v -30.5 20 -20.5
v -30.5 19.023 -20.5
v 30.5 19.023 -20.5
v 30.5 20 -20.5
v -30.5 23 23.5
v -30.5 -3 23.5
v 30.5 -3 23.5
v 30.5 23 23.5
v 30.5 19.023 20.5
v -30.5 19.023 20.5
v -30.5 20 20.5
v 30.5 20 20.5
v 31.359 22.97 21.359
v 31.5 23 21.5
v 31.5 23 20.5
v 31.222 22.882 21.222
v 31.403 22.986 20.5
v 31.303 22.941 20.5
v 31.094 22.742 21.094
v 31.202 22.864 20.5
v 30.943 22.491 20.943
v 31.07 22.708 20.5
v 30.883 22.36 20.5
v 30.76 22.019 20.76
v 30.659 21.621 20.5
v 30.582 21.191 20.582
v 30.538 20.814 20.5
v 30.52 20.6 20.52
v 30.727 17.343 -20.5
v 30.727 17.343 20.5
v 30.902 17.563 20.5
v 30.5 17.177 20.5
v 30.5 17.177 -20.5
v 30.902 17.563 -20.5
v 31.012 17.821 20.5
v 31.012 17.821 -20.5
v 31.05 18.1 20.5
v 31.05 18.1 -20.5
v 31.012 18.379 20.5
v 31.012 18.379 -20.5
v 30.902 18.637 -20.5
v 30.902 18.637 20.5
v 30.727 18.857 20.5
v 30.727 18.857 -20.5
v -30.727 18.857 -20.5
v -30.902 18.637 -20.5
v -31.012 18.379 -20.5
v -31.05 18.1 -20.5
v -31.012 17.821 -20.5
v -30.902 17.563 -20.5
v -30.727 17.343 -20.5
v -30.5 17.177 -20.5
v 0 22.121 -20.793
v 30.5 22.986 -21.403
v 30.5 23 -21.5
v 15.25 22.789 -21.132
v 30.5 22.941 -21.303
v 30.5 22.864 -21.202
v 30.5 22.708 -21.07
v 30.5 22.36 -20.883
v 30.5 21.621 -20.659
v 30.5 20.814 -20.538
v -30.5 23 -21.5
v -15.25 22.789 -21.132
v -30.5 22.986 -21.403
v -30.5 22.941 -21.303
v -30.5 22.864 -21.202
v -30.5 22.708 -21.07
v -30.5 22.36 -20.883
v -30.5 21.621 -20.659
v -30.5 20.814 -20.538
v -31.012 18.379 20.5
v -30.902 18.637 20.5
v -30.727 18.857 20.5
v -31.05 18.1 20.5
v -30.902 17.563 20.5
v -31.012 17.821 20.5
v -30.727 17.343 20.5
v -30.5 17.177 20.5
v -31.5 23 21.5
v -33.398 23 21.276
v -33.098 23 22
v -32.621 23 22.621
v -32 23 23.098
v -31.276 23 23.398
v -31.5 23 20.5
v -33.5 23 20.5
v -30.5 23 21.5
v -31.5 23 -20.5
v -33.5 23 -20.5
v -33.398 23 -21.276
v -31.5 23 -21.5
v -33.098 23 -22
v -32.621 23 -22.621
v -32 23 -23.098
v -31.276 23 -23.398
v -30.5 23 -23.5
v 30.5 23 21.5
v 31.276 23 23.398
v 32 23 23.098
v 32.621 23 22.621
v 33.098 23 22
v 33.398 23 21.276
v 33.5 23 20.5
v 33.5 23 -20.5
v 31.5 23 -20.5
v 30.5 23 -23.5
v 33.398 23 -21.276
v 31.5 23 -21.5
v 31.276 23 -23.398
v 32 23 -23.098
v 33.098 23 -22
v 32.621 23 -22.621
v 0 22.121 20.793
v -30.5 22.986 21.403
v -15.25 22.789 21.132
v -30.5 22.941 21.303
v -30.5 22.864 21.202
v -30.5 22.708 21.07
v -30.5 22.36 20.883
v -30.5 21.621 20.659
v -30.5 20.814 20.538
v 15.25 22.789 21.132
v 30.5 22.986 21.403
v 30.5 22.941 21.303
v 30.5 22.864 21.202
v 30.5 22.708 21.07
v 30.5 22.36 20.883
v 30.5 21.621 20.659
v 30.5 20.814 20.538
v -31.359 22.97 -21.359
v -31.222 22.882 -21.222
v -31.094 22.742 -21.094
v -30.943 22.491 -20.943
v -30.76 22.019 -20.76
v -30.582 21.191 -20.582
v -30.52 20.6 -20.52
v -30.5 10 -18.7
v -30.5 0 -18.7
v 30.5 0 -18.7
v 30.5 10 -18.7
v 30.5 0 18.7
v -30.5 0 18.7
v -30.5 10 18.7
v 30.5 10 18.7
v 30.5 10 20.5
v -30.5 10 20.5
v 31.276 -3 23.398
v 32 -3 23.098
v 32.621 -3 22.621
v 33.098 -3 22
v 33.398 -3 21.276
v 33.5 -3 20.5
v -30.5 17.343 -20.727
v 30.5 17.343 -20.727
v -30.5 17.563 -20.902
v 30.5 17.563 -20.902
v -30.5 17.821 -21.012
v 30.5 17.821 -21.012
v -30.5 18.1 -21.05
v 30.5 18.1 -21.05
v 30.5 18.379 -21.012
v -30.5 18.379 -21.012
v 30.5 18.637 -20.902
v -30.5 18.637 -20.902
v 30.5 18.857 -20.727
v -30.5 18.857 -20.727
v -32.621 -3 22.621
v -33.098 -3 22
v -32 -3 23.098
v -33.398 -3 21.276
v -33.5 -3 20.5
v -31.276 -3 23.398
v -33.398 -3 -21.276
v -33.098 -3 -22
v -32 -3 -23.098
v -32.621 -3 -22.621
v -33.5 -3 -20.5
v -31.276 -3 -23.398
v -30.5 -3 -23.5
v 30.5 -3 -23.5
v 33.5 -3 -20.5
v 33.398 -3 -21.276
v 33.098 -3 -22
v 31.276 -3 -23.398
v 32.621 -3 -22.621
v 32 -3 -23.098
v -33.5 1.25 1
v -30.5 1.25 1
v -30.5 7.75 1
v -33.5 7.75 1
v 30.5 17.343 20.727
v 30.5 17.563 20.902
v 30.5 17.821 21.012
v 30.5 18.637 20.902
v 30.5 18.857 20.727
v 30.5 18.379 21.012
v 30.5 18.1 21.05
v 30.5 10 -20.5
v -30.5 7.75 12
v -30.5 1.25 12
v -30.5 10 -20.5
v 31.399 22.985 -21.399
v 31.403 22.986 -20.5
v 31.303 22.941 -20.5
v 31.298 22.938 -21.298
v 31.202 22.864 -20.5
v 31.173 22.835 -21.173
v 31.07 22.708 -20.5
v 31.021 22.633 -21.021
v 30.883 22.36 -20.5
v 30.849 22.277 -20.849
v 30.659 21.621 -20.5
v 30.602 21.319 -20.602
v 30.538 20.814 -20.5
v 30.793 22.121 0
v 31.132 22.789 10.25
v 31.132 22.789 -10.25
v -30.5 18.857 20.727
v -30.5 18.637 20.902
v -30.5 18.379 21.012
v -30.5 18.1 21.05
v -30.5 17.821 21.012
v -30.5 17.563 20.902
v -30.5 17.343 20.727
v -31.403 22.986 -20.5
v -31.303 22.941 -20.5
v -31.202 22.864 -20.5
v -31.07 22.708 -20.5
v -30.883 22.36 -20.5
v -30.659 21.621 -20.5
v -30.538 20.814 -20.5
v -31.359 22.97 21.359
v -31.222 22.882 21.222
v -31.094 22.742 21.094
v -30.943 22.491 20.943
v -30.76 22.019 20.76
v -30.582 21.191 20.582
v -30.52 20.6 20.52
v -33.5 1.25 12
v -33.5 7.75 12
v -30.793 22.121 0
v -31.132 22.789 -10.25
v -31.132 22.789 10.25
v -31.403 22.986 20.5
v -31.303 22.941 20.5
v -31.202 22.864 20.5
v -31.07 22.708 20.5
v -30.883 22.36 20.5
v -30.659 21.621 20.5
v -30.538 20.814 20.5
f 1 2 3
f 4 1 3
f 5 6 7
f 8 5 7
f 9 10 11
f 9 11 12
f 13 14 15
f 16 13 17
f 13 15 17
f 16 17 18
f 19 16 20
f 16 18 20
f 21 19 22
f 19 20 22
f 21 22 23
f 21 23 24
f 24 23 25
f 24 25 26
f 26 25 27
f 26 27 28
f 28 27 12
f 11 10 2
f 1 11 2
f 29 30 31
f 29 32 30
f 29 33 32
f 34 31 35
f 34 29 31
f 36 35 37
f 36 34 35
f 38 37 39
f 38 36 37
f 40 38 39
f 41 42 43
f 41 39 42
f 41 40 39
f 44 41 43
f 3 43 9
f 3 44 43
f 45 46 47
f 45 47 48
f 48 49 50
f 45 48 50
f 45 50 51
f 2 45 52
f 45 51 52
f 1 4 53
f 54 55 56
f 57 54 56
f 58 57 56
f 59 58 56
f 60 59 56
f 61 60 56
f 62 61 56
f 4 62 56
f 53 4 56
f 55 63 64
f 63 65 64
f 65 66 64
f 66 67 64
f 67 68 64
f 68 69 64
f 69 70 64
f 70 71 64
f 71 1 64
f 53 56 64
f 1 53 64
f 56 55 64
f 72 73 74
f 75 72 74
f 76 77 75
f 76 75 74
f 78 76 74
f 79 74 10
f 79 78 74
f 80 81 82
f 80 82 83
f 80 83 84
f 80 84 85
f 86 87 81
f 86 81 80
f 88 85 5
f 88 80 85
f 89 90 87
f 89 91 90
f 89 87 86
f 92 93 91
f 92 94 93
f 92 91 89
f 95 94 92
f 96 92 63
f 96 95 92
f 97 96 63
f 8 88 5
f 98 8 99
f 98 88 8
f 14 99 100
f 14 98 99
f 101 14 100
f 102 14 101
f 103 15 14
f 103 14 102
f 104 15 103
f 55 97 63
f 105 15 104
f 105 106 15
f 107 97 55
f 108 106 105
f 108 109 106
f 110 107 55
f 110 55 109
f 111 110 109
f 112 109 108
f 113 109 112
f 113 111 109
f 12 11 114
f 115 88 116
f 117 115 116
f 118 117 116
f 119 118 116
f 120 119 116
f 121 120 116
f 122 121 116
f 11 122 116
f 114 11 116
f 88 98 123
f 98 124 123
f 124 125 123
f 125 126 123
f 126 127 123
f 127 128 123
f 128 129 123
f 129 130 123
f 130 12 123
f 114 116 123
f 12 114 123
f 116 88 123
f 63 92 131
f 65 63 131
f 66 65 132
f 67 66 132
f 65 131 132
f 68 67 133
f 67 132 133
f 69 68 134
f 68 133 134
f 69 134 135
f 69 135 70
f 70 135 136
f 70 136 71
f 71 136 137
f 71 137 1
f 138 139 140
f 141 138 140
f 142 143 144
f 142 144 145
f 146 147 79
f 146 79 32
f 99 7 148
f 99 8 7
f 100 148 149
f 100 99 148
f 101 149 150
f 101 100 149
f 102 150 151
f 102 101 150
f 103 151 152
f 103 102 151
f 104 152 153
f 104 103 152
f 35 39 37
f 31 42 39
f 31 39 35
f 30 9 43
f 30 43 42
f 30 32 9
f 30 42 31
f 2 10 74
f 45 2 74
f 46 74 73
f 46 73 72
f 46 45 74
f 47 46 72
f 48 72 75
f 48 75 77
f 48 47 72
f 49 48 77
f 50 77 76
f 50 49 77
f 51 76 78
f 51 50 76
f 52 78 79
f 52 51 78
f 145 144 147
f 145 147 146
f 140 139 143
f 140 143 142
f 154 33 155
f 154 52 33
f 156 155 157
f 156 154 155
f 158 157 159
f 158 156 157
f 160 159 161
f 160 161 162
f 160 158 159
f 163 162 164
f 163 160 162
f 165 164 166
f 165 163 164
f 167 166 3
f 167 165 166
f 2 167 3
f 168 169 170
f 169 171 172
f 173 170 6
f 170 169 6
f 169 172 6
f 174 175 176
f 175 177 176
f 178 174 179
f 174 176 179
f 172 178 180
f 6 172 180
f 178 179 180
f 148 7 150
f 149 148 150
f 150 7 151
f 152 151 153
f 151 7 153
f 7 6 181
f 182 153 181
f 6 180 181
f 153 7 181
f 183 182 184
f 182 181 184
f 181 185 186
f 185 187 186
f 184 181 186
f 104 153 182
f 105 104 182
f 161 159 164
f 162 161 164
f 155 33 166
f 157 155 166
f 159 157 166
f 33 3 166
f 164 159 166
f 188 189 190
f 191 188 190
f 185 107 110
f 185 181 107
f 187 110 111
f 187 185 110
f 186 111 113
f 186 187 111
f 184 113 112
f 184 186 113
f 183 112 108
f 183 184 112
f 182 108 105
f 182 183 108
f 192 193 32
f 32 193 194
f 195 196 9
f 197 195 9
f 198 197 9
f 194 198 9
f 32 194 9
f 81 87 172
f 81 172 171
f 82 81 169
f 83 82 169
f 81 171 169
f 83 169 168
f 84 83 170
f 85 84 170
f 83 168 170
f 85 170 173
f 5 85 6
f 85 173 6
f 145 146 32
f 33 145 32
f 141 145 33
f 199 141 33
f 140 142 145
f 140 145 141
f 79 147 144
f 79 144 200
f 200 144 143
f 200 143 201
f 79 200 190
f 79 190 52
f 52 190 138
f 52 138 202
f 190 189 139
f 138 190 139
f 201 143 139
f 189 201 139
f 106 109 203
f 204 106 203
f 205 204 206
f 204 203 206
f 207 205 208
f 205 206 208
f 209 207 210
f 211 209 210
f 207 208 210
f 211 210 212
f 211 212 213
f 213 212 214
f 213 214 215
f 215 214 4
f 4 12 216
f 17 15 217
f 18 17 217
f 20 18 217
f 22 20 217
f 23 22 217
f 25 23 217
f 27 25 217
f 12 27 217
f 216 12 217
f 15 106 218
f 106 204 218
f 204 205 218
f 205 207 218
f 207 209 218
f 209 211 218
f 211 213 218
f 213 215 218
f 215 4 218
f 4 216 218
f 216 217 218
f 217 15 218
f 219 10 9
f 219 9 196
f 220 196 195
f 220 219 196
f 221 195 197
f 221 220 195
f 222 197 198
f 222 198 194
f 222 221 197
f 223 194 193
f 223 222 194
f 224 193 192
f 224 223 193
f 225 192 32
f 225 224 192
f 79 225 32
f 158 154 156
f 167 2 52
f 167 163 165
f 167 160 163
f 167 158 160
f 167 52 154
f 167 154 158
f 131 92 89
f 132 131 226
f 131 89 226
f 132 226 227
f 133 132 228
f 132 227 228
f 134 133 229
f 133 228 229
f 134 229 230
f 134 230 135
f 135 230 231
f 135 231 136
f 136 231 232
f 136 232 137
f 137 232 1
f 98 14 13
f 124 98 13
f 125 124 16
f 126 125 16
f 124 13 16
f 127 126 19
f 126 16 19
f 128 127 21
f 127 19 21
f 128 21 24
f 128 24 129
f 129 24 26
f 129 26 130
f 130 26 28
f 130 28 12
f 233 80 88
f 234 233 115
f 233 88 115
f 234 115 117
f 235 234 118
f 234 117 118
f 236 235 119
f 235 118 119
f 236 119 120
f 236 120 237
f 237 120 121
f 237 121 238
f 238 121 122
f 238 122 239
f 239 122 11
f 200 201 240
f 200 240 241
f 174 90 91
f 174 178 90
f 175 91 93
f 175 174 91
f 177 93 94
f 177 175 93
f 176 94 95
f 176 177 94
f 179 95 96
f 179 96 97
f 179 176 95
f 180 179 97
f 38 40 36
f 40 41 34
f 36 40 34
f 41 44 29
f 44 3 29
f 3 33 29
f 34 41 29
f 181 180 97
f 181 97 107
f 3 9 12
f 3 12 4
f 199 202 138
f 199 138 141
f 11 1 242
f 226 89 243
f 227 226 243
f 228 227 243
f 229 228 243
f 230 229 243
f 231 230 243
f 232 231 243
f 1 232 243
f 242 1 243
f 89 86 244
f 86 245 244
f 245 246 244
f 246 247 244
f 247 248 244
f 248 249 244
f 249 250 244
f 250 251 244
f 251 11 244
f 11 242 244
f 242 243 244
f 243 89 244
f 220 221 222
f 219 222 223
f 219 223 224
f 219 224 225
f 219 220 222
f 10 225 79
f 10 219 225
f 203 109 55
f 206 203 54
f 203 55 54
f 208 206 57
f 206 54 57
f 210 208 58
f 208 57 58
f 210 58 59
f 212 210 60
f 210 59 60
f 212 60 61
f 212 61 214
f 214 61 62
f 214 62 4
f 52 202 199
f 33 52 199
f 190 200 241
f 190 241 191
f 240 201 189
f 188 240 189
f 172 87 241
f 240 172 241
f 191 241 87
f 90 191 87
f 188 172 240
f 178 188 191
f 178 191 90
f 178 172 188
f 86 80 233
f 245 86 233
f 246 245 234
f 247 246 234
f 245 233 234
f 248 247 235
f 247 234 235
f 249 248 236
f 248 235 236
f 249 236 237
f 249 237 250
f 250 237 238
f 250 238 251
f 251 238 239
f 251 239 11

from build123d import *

# Parameters (mm, degrees)
SKETCH1_W           = 61
SKETCH1_H           = 41
BOSS_EXTRUDE1_DEPTH = 23
SHELL1_T            = 3
SKETCH2_W           = 11
SKETCH2_H           = 6.5
CUT_EXTRUDE1_DEPTH  = 72.953109731
SKETCH3_W           = 61
SKETCH3_H           = 1.8
BOSS_EXTRUDE2_DEPTH = 10
SKETCH4_R           = 1.05
CUT_EXTRUDE2_DEPTH  = 41
SKETCH5_R           = 1.05
CUT_EXTRUDE3_DEPTH  = 61
FILLET1_SIZE        = 1
FILLET1_SIZE_2      = 3
FILLET2_R           = 3


with BuildPart() as part:
    # Sketch1 → Boss-Extrude1 (new body)
    with BuildSketch(Plane(origin=(0, 0, 0), x_dir=(1, 0, 0), z_dir=(0, 1, 0))):
        Rectangle(SKETCH1_W, SKETCH1_H)
    extrude(amount=BOSS_EXTRUDE1_DEPTH)

    # Shell1
    shell1_openings = [part.faces().sort_by_distance(p)[0] for p in [
        (0, 23, 0),
    ]]
    offset(amount=SHELL1_T, openings=shell1_openings, kind=Kind.INTERSECTION)

    # Sketch2 → Cut-Extrude1 (cut, through all)
    with BuildSketch(Plane(origin=(-30.5, 0, 0), x_dir=(0, 0, -1), z_dir=(1, 0, 0))):
        with Locations((-6.5, 4.5)):
            Rectangle(SKETCH2_W, SKETCH2_H)
    extrude(amount=-CUT_EXTRUDE1_DEPTH, mode=Mode.SUBTRACT)

    # Sketch3 → Boss-Extrude2 (add)
    with BuildSketch(Plane(origin=(0, 0, 0), x_dir=(1, 0, 0), z_dir=(0, 1, 0))):
        with Locations((0, 19.6)):
            Rectangle(SKETCH3_W, SKETCH3_H)
        with Locations((0, -19.6)):
            Rectangle(SKETCH3_W, SKETCH3_H)
    extrude(amount=BOSS_EXTRUDE2_DEPTH)

    # Sketch4 → Cut-Extrude2 (cut)
    with BuildSketch(Plane.XY.offset(-20.5)):
        with Locations((-30, 18.1)):
            Circle(SKETCH4_R)
        with Locations((30, 18.1)):
            Circle(SKETCH4_R)
    extrude(amount=CUT_EXTRUDE2_DEPTH, mode=Mode.SUBTRACT)

    # Sketch5 → Cut-Extrude3 (cut)
    with BuildSketch(Plane(origin=(-30.5, 0, 0), x_dir=(0, 0, -1), z_dir=(1, 0, 0))):
        with Locations((-20, 18.1)):
            Circle(SKETCH5_R)
        with Locations((20, 18.1)):
            Circle(SKETCH5_R)
    extrude(amount=CUT_EXTRUDE3_DEPTH, mode=Mode.SUBTRACT)

    # Fillet1
    # an asymmetric fillet: 3, 1 mm, written as the material it takes off along each edge
    with BuildSketch(Plane(origin=(30.5, 23, 20.5), x_dir=(0, 0, 1), z_dir=(-1, 0, 0)), Plane(origin=(-30.5, 23, -20.5), x_dir=(0, 0, -1), z_dir=(1, 0, 0))) as fillet1_piece_1:
        with BuildLine():
            Bezier((FILLET1_SIZE, 0), (0, 0), (0, -FILLET1_SIZE_2), weights=[1, 0.707106781, 1])
            Line((0, -FILLET1_SIZE_2), (-0.06, -3))
            Line((-0.06, -3), (-0.06, 0.06))
            Line((-0.06, 0.06), (1, 0.06))
            Line((1, 0.06), (FILLET1_SIZE, 0))
        make_face()
    extrude(amount=61, mode=Mode.SUBTRACT)
    with BuildSketch(Plane(origin=(30.5, 23, -20.5), x_dir=(1, 0, 0), z_dir=(0, 0, 1)), Plane(origin=(-30.5, 23, 20.5), x_dir=(-1, 0, 0), z_dir=(0, 0, -1))) as fillet1_piece_2:
        with BuildLine():
            Bezier((FILLET1_SIZE, 0), (0, 0), (0, -FILLET1_SIZE_2), weights=[1, 0.707106781, 1])
            Line((0, -FILLET1_SIZE_2), (-0.06, -3))
            Line((-0.06, -3), (-0.06, 0.06))
            Line((-0.06, 0.06), (1, 0.06))
            Line((1, 0.06), (FILLET1_SIZE, 0))
        make_face()
    extrude(amount=41, mode=Mode.SUBTRACT)
    with BuildSketch(Plane(origin=(38, 23, 20.5), x_dir=(0, 0, 1), z_dir=(-1, 0, 0))) as fillet1_piece_3a_section:
        with BuildLine():
            Bezier((FILLET1_SIZE, 0), (0, 0), (0, -FILLET1_SIZE_2), weights=[1, 0.707106781, 1])
            Line((0, -FILLET1_SIZE_2), (-0.06, -3))
            Line((-0.06, -3), (-0.06, 0.06))
            Line((-0.06, 0.06), (1, 0.06))
            Line((1, 0.06), (FILLET1_SIZE, 0))
        make_face()
    fillet1_piece_3a = extrude(amount=68.5, mode=Mode.PRIVATE)
    fillet1_piece_3a = split(fillet1_piece_3a, bisect_by=Plane(origin=(30.5, 22.211737764, 20.689651293), z_dir=(1, 0, 0)), keep=Keep.TOP, mode=Mode.PRIVATE)
    with BuildSketch(Plane(origin=(30.5, 23, -20.5), x_dir=(1, 0, 0), z_dir=(0, 0, 1))) as fillet1_piece_3b_section:
        with BuildLine():
            Bezier((FILLET1_SIZE, 0), (0, 0), (0, -FILLET1_SIZE_2), weights=[1, 0.707106781, 1])
            Line((0, -FILLET1_SIZE_2), (-0.06, -3))
            Line((-0.06, -3), (-0.06, 0.06))
            Line((-0.06, 0.06), (1, 0.06))
            Line((1, 0.06), (FILLET1_SIZE, 0))
        make_face()
    fillet1_piece_3b = extrude(amount=48.5, mode=Mode.PRIVATE)
    fillet1_piece_3b = split(fillet1_piece_3b, bisect_by=Plane(origin=(30.689651156, 22.211737177, 20.5), z_dir=(0, 0, 1)), keep=Keep.TOP, mode=Mode.PRIVATE)
    fillet1_piece_3 = fillet1_piece_3a & fillet1_piece_3b
    add(fillet1_piece_3, mode=Mode.SUBTRACT)
    with BuildSketch(Plane(origin=(-30.5, 23, 28), x_dir=(-1, 0, 0), z_dir=(0, 0, -1))) as fillet1_piece_4a_section:
        with BuildLine():
            Bezier((FILLET1_SIZE, 0), (0, 0), (0, -FILLET1_SIZE_2), weights=[1, 0.707106781, 1])
            Line((0, -FILLET1_SIZE_2), (-0.06, -3))
            Line((-0.06, -3), (-0.06, 0.06))
            Line((-0.06, 0.06), (1, 0.06))
            Line((1, 0.06), (FILLET1_SIZE, 0))
        make_face()
    fillet1_piece_4a = extrude(amount=48.5, mode=Mode.PRIVATE)
    fillet1_piece_4a = split(fillet1_piece_4a, bisect_by=Plane(origin=(-30.689651293, 22.211737761, 20.5), z_dir=(0, 0, 1)), keep=Keep.TOP, mode=Mode.PRIVATE)
    with BuildSketch(Plane(origin=(30.5, 23, 20.5), x_dir=(0, 0, 1), z_dir=(-1, 0, 0))) as fillet1_piece_4b_section:
        with BuildLine():
            Bezier((FILLET1_SIZE, 0), (0, 0), (0, -FILLET1_SIZE_2), weights=[1, 0.707106781, 1])
            Line((0, -FILLET1_SIZE_2), (-0.06, -3))
            Line((-0.06, -3), (-0.06, 0.06))
            Line((-0.06, 0.06), (1, 0.06))
            Line((1, 0.06), (FILLET1_SIZE, 0))
        make_face()
    fillet1_piece_4b = extrude(amount=68.5, mode=Mode.PRIVATE)
    fillet1_piece_4b = split(fillet1_piece_4b, bisect_by=Plane(origin=(-30.5, 22.211737179, 20.689651156), z_dir=(-1, 0, 0)), keep=Keep.TOP, mode=Mode.PRIVATE)
    fillet1_piece_4 = fillet1_piece_4a & fillet1_piece_4b
    add(fillet1_piece_4, mode=Mode.SUBTRACT)
    with BuildSketch(Plane(origin=(-30.5, 23, -20.5), x_dir=(0, 0, -1), z_dir=(1, 0, 0))) as fillet1_piece_5a_section:
        with BuildLine():
            Bezier((FILLET1_SIZE, 0), (0, 0), (0, -FILLET1_SIZE_2), weights=[1, 0.707106781, 1])
            Line((0, -FILLET1_SIZE_2), (-0.06, -3))
            Line((-0.06, -3), (-0.06, 0.06))
            Line((-0.06, 0.06), (1, 0.06))
            Line((1, 0.06), (FILLET1_SIZE, 0))
        make_face()
    fillet1_piece_5a = extrude(amount=68.5, mode=Mode.PRIVATE)
    fillet1_piece_5a = split(fillet1_piece_5a, bisect_by=Plane(origin=(30.5, 22.211737179, -20.689651156), z_dir=(1, 0, 0)), keep=Keep.TOP, mode=Mode.PRIVATE)
    with BuildSketch(Plane(origin=(30.5, 23, -28), x_dir=(1, 0, 0), z_dir=(0, 0, 1))) as fillet1_piece_5b_section:
        with BuildLine():
            Bezier((FILLET1_SIZE, 0), (0, 0), (0, -FILLET1_SIZE_2), weights=[1, 0.707106781, 1])
            Line((0, -FILLET1_SIZE_2), (-0.06, -3))
            Line((-0.06, -3), (-0.06, 0.06))
            Line((-0.06, 0.06), (1, 0.06))
            Line((1, 0.06), (FILLET1_SIZE, 0))
        make_face()
    fillet1_piece_5b = extrude(amount=48.5, mode=Mode.PRIVATE)
    fillet1_piece_5b = split(fillet1_piece_5b, bisect_by=Plane(origin=(30.689651293, 22.211737761, -20.5), z_dir=(0, 0, -1)), keep=Keep.TOP, mode=Mode.PRIVATE)
    fillet1_piece_5 = fillet1_piece_5a & fillet1_piece_5b
    add(fillet1_piece_5, mode=Mode.SUBTRACT)
    with BuildSketch(Plane(origin=(-38, 23, -20.5), x_dir=(0, 0, -1), z_dir=(1, 0, 0))) as fillet1_piece_6a_section:
        with BuildLine():
            Bezier((FILLET1_SIZE, 0), (0, 0), (0, -FILLET1_SIZE_2), weights=[1, 0.707106781, 1])
            Line((0, -FILLET1_SIZE_2), (-0.06, -3))
            Line((-0.06, -3), (-0.06, 0.06))
            Line((-0.06, 0.06), (1, 0.06))
            Line((1, 0.06), (FILLET1_SIZE, 0))
        make_face()
    fillet1_piece_6a = extrude(amount=68.5, mode=Mode.PRIVATE)
    fillet1_piece_6a = split(fillet1_piece_6a, bisect_by=Plane(origin=(-30.5, 22.211737764, -20.689651293), z_dir=(-1, 0, 0)), keep=Keep.TOP, mode=Mode.PRIVATE)
    with BuildSketch(Plane(origin=(-30.5, 23, 20.5), x_dir=(-1, 0, 0), z_dir=(0, 0, -1))) as fillet1_piece_6b_section:
        with BuildLine():
            Bezier((FILLET1_SIZE, 0), (0, 0), (0, -FILLET1_SIZE_2), weights=[1, 0.707106781, 1])
            Line((0, -FILLET1_SIZE_2), (-0.06, -3))
            Line((-0.06, -3), (-0.06, 0.06))
            Line((-0.06, 0.06), (1, 0.06))
            Line((1, 0.06), (FILLET1_SIZE, 0))
        make_face()
    fillet1_piece_6b = extrude(amount=48.5, mode=Mode.PRIVATE)
    fillet1_piece_6b = split(fillet1_piece_6b, bisect_by=Plane(origin=(-30.689651156, 22.211737177, -20.5), z_dir=(0, 0, -1)), keep=Keep.TOP, mode=Mode.PRIVATE)
    fillet1_piece_6 = fillet1_piece_6a & fillet1_piece_6b
    add(fillet1_piece_6, mode=Mode.SUBTRACT)

    # Fillet2
    fillet2_edges = [part.edges().sort_by_distance(p)[0] for p in [
        (33.5, 10, 23.5),
        (-33.5, 10, 23.5),
        (-33.5, 10, -23.5),
        (33.5, 10, -23.5),
    ]]
    fillet(fillet2_edges, radius=FILLET2_R)


solid = part.part
